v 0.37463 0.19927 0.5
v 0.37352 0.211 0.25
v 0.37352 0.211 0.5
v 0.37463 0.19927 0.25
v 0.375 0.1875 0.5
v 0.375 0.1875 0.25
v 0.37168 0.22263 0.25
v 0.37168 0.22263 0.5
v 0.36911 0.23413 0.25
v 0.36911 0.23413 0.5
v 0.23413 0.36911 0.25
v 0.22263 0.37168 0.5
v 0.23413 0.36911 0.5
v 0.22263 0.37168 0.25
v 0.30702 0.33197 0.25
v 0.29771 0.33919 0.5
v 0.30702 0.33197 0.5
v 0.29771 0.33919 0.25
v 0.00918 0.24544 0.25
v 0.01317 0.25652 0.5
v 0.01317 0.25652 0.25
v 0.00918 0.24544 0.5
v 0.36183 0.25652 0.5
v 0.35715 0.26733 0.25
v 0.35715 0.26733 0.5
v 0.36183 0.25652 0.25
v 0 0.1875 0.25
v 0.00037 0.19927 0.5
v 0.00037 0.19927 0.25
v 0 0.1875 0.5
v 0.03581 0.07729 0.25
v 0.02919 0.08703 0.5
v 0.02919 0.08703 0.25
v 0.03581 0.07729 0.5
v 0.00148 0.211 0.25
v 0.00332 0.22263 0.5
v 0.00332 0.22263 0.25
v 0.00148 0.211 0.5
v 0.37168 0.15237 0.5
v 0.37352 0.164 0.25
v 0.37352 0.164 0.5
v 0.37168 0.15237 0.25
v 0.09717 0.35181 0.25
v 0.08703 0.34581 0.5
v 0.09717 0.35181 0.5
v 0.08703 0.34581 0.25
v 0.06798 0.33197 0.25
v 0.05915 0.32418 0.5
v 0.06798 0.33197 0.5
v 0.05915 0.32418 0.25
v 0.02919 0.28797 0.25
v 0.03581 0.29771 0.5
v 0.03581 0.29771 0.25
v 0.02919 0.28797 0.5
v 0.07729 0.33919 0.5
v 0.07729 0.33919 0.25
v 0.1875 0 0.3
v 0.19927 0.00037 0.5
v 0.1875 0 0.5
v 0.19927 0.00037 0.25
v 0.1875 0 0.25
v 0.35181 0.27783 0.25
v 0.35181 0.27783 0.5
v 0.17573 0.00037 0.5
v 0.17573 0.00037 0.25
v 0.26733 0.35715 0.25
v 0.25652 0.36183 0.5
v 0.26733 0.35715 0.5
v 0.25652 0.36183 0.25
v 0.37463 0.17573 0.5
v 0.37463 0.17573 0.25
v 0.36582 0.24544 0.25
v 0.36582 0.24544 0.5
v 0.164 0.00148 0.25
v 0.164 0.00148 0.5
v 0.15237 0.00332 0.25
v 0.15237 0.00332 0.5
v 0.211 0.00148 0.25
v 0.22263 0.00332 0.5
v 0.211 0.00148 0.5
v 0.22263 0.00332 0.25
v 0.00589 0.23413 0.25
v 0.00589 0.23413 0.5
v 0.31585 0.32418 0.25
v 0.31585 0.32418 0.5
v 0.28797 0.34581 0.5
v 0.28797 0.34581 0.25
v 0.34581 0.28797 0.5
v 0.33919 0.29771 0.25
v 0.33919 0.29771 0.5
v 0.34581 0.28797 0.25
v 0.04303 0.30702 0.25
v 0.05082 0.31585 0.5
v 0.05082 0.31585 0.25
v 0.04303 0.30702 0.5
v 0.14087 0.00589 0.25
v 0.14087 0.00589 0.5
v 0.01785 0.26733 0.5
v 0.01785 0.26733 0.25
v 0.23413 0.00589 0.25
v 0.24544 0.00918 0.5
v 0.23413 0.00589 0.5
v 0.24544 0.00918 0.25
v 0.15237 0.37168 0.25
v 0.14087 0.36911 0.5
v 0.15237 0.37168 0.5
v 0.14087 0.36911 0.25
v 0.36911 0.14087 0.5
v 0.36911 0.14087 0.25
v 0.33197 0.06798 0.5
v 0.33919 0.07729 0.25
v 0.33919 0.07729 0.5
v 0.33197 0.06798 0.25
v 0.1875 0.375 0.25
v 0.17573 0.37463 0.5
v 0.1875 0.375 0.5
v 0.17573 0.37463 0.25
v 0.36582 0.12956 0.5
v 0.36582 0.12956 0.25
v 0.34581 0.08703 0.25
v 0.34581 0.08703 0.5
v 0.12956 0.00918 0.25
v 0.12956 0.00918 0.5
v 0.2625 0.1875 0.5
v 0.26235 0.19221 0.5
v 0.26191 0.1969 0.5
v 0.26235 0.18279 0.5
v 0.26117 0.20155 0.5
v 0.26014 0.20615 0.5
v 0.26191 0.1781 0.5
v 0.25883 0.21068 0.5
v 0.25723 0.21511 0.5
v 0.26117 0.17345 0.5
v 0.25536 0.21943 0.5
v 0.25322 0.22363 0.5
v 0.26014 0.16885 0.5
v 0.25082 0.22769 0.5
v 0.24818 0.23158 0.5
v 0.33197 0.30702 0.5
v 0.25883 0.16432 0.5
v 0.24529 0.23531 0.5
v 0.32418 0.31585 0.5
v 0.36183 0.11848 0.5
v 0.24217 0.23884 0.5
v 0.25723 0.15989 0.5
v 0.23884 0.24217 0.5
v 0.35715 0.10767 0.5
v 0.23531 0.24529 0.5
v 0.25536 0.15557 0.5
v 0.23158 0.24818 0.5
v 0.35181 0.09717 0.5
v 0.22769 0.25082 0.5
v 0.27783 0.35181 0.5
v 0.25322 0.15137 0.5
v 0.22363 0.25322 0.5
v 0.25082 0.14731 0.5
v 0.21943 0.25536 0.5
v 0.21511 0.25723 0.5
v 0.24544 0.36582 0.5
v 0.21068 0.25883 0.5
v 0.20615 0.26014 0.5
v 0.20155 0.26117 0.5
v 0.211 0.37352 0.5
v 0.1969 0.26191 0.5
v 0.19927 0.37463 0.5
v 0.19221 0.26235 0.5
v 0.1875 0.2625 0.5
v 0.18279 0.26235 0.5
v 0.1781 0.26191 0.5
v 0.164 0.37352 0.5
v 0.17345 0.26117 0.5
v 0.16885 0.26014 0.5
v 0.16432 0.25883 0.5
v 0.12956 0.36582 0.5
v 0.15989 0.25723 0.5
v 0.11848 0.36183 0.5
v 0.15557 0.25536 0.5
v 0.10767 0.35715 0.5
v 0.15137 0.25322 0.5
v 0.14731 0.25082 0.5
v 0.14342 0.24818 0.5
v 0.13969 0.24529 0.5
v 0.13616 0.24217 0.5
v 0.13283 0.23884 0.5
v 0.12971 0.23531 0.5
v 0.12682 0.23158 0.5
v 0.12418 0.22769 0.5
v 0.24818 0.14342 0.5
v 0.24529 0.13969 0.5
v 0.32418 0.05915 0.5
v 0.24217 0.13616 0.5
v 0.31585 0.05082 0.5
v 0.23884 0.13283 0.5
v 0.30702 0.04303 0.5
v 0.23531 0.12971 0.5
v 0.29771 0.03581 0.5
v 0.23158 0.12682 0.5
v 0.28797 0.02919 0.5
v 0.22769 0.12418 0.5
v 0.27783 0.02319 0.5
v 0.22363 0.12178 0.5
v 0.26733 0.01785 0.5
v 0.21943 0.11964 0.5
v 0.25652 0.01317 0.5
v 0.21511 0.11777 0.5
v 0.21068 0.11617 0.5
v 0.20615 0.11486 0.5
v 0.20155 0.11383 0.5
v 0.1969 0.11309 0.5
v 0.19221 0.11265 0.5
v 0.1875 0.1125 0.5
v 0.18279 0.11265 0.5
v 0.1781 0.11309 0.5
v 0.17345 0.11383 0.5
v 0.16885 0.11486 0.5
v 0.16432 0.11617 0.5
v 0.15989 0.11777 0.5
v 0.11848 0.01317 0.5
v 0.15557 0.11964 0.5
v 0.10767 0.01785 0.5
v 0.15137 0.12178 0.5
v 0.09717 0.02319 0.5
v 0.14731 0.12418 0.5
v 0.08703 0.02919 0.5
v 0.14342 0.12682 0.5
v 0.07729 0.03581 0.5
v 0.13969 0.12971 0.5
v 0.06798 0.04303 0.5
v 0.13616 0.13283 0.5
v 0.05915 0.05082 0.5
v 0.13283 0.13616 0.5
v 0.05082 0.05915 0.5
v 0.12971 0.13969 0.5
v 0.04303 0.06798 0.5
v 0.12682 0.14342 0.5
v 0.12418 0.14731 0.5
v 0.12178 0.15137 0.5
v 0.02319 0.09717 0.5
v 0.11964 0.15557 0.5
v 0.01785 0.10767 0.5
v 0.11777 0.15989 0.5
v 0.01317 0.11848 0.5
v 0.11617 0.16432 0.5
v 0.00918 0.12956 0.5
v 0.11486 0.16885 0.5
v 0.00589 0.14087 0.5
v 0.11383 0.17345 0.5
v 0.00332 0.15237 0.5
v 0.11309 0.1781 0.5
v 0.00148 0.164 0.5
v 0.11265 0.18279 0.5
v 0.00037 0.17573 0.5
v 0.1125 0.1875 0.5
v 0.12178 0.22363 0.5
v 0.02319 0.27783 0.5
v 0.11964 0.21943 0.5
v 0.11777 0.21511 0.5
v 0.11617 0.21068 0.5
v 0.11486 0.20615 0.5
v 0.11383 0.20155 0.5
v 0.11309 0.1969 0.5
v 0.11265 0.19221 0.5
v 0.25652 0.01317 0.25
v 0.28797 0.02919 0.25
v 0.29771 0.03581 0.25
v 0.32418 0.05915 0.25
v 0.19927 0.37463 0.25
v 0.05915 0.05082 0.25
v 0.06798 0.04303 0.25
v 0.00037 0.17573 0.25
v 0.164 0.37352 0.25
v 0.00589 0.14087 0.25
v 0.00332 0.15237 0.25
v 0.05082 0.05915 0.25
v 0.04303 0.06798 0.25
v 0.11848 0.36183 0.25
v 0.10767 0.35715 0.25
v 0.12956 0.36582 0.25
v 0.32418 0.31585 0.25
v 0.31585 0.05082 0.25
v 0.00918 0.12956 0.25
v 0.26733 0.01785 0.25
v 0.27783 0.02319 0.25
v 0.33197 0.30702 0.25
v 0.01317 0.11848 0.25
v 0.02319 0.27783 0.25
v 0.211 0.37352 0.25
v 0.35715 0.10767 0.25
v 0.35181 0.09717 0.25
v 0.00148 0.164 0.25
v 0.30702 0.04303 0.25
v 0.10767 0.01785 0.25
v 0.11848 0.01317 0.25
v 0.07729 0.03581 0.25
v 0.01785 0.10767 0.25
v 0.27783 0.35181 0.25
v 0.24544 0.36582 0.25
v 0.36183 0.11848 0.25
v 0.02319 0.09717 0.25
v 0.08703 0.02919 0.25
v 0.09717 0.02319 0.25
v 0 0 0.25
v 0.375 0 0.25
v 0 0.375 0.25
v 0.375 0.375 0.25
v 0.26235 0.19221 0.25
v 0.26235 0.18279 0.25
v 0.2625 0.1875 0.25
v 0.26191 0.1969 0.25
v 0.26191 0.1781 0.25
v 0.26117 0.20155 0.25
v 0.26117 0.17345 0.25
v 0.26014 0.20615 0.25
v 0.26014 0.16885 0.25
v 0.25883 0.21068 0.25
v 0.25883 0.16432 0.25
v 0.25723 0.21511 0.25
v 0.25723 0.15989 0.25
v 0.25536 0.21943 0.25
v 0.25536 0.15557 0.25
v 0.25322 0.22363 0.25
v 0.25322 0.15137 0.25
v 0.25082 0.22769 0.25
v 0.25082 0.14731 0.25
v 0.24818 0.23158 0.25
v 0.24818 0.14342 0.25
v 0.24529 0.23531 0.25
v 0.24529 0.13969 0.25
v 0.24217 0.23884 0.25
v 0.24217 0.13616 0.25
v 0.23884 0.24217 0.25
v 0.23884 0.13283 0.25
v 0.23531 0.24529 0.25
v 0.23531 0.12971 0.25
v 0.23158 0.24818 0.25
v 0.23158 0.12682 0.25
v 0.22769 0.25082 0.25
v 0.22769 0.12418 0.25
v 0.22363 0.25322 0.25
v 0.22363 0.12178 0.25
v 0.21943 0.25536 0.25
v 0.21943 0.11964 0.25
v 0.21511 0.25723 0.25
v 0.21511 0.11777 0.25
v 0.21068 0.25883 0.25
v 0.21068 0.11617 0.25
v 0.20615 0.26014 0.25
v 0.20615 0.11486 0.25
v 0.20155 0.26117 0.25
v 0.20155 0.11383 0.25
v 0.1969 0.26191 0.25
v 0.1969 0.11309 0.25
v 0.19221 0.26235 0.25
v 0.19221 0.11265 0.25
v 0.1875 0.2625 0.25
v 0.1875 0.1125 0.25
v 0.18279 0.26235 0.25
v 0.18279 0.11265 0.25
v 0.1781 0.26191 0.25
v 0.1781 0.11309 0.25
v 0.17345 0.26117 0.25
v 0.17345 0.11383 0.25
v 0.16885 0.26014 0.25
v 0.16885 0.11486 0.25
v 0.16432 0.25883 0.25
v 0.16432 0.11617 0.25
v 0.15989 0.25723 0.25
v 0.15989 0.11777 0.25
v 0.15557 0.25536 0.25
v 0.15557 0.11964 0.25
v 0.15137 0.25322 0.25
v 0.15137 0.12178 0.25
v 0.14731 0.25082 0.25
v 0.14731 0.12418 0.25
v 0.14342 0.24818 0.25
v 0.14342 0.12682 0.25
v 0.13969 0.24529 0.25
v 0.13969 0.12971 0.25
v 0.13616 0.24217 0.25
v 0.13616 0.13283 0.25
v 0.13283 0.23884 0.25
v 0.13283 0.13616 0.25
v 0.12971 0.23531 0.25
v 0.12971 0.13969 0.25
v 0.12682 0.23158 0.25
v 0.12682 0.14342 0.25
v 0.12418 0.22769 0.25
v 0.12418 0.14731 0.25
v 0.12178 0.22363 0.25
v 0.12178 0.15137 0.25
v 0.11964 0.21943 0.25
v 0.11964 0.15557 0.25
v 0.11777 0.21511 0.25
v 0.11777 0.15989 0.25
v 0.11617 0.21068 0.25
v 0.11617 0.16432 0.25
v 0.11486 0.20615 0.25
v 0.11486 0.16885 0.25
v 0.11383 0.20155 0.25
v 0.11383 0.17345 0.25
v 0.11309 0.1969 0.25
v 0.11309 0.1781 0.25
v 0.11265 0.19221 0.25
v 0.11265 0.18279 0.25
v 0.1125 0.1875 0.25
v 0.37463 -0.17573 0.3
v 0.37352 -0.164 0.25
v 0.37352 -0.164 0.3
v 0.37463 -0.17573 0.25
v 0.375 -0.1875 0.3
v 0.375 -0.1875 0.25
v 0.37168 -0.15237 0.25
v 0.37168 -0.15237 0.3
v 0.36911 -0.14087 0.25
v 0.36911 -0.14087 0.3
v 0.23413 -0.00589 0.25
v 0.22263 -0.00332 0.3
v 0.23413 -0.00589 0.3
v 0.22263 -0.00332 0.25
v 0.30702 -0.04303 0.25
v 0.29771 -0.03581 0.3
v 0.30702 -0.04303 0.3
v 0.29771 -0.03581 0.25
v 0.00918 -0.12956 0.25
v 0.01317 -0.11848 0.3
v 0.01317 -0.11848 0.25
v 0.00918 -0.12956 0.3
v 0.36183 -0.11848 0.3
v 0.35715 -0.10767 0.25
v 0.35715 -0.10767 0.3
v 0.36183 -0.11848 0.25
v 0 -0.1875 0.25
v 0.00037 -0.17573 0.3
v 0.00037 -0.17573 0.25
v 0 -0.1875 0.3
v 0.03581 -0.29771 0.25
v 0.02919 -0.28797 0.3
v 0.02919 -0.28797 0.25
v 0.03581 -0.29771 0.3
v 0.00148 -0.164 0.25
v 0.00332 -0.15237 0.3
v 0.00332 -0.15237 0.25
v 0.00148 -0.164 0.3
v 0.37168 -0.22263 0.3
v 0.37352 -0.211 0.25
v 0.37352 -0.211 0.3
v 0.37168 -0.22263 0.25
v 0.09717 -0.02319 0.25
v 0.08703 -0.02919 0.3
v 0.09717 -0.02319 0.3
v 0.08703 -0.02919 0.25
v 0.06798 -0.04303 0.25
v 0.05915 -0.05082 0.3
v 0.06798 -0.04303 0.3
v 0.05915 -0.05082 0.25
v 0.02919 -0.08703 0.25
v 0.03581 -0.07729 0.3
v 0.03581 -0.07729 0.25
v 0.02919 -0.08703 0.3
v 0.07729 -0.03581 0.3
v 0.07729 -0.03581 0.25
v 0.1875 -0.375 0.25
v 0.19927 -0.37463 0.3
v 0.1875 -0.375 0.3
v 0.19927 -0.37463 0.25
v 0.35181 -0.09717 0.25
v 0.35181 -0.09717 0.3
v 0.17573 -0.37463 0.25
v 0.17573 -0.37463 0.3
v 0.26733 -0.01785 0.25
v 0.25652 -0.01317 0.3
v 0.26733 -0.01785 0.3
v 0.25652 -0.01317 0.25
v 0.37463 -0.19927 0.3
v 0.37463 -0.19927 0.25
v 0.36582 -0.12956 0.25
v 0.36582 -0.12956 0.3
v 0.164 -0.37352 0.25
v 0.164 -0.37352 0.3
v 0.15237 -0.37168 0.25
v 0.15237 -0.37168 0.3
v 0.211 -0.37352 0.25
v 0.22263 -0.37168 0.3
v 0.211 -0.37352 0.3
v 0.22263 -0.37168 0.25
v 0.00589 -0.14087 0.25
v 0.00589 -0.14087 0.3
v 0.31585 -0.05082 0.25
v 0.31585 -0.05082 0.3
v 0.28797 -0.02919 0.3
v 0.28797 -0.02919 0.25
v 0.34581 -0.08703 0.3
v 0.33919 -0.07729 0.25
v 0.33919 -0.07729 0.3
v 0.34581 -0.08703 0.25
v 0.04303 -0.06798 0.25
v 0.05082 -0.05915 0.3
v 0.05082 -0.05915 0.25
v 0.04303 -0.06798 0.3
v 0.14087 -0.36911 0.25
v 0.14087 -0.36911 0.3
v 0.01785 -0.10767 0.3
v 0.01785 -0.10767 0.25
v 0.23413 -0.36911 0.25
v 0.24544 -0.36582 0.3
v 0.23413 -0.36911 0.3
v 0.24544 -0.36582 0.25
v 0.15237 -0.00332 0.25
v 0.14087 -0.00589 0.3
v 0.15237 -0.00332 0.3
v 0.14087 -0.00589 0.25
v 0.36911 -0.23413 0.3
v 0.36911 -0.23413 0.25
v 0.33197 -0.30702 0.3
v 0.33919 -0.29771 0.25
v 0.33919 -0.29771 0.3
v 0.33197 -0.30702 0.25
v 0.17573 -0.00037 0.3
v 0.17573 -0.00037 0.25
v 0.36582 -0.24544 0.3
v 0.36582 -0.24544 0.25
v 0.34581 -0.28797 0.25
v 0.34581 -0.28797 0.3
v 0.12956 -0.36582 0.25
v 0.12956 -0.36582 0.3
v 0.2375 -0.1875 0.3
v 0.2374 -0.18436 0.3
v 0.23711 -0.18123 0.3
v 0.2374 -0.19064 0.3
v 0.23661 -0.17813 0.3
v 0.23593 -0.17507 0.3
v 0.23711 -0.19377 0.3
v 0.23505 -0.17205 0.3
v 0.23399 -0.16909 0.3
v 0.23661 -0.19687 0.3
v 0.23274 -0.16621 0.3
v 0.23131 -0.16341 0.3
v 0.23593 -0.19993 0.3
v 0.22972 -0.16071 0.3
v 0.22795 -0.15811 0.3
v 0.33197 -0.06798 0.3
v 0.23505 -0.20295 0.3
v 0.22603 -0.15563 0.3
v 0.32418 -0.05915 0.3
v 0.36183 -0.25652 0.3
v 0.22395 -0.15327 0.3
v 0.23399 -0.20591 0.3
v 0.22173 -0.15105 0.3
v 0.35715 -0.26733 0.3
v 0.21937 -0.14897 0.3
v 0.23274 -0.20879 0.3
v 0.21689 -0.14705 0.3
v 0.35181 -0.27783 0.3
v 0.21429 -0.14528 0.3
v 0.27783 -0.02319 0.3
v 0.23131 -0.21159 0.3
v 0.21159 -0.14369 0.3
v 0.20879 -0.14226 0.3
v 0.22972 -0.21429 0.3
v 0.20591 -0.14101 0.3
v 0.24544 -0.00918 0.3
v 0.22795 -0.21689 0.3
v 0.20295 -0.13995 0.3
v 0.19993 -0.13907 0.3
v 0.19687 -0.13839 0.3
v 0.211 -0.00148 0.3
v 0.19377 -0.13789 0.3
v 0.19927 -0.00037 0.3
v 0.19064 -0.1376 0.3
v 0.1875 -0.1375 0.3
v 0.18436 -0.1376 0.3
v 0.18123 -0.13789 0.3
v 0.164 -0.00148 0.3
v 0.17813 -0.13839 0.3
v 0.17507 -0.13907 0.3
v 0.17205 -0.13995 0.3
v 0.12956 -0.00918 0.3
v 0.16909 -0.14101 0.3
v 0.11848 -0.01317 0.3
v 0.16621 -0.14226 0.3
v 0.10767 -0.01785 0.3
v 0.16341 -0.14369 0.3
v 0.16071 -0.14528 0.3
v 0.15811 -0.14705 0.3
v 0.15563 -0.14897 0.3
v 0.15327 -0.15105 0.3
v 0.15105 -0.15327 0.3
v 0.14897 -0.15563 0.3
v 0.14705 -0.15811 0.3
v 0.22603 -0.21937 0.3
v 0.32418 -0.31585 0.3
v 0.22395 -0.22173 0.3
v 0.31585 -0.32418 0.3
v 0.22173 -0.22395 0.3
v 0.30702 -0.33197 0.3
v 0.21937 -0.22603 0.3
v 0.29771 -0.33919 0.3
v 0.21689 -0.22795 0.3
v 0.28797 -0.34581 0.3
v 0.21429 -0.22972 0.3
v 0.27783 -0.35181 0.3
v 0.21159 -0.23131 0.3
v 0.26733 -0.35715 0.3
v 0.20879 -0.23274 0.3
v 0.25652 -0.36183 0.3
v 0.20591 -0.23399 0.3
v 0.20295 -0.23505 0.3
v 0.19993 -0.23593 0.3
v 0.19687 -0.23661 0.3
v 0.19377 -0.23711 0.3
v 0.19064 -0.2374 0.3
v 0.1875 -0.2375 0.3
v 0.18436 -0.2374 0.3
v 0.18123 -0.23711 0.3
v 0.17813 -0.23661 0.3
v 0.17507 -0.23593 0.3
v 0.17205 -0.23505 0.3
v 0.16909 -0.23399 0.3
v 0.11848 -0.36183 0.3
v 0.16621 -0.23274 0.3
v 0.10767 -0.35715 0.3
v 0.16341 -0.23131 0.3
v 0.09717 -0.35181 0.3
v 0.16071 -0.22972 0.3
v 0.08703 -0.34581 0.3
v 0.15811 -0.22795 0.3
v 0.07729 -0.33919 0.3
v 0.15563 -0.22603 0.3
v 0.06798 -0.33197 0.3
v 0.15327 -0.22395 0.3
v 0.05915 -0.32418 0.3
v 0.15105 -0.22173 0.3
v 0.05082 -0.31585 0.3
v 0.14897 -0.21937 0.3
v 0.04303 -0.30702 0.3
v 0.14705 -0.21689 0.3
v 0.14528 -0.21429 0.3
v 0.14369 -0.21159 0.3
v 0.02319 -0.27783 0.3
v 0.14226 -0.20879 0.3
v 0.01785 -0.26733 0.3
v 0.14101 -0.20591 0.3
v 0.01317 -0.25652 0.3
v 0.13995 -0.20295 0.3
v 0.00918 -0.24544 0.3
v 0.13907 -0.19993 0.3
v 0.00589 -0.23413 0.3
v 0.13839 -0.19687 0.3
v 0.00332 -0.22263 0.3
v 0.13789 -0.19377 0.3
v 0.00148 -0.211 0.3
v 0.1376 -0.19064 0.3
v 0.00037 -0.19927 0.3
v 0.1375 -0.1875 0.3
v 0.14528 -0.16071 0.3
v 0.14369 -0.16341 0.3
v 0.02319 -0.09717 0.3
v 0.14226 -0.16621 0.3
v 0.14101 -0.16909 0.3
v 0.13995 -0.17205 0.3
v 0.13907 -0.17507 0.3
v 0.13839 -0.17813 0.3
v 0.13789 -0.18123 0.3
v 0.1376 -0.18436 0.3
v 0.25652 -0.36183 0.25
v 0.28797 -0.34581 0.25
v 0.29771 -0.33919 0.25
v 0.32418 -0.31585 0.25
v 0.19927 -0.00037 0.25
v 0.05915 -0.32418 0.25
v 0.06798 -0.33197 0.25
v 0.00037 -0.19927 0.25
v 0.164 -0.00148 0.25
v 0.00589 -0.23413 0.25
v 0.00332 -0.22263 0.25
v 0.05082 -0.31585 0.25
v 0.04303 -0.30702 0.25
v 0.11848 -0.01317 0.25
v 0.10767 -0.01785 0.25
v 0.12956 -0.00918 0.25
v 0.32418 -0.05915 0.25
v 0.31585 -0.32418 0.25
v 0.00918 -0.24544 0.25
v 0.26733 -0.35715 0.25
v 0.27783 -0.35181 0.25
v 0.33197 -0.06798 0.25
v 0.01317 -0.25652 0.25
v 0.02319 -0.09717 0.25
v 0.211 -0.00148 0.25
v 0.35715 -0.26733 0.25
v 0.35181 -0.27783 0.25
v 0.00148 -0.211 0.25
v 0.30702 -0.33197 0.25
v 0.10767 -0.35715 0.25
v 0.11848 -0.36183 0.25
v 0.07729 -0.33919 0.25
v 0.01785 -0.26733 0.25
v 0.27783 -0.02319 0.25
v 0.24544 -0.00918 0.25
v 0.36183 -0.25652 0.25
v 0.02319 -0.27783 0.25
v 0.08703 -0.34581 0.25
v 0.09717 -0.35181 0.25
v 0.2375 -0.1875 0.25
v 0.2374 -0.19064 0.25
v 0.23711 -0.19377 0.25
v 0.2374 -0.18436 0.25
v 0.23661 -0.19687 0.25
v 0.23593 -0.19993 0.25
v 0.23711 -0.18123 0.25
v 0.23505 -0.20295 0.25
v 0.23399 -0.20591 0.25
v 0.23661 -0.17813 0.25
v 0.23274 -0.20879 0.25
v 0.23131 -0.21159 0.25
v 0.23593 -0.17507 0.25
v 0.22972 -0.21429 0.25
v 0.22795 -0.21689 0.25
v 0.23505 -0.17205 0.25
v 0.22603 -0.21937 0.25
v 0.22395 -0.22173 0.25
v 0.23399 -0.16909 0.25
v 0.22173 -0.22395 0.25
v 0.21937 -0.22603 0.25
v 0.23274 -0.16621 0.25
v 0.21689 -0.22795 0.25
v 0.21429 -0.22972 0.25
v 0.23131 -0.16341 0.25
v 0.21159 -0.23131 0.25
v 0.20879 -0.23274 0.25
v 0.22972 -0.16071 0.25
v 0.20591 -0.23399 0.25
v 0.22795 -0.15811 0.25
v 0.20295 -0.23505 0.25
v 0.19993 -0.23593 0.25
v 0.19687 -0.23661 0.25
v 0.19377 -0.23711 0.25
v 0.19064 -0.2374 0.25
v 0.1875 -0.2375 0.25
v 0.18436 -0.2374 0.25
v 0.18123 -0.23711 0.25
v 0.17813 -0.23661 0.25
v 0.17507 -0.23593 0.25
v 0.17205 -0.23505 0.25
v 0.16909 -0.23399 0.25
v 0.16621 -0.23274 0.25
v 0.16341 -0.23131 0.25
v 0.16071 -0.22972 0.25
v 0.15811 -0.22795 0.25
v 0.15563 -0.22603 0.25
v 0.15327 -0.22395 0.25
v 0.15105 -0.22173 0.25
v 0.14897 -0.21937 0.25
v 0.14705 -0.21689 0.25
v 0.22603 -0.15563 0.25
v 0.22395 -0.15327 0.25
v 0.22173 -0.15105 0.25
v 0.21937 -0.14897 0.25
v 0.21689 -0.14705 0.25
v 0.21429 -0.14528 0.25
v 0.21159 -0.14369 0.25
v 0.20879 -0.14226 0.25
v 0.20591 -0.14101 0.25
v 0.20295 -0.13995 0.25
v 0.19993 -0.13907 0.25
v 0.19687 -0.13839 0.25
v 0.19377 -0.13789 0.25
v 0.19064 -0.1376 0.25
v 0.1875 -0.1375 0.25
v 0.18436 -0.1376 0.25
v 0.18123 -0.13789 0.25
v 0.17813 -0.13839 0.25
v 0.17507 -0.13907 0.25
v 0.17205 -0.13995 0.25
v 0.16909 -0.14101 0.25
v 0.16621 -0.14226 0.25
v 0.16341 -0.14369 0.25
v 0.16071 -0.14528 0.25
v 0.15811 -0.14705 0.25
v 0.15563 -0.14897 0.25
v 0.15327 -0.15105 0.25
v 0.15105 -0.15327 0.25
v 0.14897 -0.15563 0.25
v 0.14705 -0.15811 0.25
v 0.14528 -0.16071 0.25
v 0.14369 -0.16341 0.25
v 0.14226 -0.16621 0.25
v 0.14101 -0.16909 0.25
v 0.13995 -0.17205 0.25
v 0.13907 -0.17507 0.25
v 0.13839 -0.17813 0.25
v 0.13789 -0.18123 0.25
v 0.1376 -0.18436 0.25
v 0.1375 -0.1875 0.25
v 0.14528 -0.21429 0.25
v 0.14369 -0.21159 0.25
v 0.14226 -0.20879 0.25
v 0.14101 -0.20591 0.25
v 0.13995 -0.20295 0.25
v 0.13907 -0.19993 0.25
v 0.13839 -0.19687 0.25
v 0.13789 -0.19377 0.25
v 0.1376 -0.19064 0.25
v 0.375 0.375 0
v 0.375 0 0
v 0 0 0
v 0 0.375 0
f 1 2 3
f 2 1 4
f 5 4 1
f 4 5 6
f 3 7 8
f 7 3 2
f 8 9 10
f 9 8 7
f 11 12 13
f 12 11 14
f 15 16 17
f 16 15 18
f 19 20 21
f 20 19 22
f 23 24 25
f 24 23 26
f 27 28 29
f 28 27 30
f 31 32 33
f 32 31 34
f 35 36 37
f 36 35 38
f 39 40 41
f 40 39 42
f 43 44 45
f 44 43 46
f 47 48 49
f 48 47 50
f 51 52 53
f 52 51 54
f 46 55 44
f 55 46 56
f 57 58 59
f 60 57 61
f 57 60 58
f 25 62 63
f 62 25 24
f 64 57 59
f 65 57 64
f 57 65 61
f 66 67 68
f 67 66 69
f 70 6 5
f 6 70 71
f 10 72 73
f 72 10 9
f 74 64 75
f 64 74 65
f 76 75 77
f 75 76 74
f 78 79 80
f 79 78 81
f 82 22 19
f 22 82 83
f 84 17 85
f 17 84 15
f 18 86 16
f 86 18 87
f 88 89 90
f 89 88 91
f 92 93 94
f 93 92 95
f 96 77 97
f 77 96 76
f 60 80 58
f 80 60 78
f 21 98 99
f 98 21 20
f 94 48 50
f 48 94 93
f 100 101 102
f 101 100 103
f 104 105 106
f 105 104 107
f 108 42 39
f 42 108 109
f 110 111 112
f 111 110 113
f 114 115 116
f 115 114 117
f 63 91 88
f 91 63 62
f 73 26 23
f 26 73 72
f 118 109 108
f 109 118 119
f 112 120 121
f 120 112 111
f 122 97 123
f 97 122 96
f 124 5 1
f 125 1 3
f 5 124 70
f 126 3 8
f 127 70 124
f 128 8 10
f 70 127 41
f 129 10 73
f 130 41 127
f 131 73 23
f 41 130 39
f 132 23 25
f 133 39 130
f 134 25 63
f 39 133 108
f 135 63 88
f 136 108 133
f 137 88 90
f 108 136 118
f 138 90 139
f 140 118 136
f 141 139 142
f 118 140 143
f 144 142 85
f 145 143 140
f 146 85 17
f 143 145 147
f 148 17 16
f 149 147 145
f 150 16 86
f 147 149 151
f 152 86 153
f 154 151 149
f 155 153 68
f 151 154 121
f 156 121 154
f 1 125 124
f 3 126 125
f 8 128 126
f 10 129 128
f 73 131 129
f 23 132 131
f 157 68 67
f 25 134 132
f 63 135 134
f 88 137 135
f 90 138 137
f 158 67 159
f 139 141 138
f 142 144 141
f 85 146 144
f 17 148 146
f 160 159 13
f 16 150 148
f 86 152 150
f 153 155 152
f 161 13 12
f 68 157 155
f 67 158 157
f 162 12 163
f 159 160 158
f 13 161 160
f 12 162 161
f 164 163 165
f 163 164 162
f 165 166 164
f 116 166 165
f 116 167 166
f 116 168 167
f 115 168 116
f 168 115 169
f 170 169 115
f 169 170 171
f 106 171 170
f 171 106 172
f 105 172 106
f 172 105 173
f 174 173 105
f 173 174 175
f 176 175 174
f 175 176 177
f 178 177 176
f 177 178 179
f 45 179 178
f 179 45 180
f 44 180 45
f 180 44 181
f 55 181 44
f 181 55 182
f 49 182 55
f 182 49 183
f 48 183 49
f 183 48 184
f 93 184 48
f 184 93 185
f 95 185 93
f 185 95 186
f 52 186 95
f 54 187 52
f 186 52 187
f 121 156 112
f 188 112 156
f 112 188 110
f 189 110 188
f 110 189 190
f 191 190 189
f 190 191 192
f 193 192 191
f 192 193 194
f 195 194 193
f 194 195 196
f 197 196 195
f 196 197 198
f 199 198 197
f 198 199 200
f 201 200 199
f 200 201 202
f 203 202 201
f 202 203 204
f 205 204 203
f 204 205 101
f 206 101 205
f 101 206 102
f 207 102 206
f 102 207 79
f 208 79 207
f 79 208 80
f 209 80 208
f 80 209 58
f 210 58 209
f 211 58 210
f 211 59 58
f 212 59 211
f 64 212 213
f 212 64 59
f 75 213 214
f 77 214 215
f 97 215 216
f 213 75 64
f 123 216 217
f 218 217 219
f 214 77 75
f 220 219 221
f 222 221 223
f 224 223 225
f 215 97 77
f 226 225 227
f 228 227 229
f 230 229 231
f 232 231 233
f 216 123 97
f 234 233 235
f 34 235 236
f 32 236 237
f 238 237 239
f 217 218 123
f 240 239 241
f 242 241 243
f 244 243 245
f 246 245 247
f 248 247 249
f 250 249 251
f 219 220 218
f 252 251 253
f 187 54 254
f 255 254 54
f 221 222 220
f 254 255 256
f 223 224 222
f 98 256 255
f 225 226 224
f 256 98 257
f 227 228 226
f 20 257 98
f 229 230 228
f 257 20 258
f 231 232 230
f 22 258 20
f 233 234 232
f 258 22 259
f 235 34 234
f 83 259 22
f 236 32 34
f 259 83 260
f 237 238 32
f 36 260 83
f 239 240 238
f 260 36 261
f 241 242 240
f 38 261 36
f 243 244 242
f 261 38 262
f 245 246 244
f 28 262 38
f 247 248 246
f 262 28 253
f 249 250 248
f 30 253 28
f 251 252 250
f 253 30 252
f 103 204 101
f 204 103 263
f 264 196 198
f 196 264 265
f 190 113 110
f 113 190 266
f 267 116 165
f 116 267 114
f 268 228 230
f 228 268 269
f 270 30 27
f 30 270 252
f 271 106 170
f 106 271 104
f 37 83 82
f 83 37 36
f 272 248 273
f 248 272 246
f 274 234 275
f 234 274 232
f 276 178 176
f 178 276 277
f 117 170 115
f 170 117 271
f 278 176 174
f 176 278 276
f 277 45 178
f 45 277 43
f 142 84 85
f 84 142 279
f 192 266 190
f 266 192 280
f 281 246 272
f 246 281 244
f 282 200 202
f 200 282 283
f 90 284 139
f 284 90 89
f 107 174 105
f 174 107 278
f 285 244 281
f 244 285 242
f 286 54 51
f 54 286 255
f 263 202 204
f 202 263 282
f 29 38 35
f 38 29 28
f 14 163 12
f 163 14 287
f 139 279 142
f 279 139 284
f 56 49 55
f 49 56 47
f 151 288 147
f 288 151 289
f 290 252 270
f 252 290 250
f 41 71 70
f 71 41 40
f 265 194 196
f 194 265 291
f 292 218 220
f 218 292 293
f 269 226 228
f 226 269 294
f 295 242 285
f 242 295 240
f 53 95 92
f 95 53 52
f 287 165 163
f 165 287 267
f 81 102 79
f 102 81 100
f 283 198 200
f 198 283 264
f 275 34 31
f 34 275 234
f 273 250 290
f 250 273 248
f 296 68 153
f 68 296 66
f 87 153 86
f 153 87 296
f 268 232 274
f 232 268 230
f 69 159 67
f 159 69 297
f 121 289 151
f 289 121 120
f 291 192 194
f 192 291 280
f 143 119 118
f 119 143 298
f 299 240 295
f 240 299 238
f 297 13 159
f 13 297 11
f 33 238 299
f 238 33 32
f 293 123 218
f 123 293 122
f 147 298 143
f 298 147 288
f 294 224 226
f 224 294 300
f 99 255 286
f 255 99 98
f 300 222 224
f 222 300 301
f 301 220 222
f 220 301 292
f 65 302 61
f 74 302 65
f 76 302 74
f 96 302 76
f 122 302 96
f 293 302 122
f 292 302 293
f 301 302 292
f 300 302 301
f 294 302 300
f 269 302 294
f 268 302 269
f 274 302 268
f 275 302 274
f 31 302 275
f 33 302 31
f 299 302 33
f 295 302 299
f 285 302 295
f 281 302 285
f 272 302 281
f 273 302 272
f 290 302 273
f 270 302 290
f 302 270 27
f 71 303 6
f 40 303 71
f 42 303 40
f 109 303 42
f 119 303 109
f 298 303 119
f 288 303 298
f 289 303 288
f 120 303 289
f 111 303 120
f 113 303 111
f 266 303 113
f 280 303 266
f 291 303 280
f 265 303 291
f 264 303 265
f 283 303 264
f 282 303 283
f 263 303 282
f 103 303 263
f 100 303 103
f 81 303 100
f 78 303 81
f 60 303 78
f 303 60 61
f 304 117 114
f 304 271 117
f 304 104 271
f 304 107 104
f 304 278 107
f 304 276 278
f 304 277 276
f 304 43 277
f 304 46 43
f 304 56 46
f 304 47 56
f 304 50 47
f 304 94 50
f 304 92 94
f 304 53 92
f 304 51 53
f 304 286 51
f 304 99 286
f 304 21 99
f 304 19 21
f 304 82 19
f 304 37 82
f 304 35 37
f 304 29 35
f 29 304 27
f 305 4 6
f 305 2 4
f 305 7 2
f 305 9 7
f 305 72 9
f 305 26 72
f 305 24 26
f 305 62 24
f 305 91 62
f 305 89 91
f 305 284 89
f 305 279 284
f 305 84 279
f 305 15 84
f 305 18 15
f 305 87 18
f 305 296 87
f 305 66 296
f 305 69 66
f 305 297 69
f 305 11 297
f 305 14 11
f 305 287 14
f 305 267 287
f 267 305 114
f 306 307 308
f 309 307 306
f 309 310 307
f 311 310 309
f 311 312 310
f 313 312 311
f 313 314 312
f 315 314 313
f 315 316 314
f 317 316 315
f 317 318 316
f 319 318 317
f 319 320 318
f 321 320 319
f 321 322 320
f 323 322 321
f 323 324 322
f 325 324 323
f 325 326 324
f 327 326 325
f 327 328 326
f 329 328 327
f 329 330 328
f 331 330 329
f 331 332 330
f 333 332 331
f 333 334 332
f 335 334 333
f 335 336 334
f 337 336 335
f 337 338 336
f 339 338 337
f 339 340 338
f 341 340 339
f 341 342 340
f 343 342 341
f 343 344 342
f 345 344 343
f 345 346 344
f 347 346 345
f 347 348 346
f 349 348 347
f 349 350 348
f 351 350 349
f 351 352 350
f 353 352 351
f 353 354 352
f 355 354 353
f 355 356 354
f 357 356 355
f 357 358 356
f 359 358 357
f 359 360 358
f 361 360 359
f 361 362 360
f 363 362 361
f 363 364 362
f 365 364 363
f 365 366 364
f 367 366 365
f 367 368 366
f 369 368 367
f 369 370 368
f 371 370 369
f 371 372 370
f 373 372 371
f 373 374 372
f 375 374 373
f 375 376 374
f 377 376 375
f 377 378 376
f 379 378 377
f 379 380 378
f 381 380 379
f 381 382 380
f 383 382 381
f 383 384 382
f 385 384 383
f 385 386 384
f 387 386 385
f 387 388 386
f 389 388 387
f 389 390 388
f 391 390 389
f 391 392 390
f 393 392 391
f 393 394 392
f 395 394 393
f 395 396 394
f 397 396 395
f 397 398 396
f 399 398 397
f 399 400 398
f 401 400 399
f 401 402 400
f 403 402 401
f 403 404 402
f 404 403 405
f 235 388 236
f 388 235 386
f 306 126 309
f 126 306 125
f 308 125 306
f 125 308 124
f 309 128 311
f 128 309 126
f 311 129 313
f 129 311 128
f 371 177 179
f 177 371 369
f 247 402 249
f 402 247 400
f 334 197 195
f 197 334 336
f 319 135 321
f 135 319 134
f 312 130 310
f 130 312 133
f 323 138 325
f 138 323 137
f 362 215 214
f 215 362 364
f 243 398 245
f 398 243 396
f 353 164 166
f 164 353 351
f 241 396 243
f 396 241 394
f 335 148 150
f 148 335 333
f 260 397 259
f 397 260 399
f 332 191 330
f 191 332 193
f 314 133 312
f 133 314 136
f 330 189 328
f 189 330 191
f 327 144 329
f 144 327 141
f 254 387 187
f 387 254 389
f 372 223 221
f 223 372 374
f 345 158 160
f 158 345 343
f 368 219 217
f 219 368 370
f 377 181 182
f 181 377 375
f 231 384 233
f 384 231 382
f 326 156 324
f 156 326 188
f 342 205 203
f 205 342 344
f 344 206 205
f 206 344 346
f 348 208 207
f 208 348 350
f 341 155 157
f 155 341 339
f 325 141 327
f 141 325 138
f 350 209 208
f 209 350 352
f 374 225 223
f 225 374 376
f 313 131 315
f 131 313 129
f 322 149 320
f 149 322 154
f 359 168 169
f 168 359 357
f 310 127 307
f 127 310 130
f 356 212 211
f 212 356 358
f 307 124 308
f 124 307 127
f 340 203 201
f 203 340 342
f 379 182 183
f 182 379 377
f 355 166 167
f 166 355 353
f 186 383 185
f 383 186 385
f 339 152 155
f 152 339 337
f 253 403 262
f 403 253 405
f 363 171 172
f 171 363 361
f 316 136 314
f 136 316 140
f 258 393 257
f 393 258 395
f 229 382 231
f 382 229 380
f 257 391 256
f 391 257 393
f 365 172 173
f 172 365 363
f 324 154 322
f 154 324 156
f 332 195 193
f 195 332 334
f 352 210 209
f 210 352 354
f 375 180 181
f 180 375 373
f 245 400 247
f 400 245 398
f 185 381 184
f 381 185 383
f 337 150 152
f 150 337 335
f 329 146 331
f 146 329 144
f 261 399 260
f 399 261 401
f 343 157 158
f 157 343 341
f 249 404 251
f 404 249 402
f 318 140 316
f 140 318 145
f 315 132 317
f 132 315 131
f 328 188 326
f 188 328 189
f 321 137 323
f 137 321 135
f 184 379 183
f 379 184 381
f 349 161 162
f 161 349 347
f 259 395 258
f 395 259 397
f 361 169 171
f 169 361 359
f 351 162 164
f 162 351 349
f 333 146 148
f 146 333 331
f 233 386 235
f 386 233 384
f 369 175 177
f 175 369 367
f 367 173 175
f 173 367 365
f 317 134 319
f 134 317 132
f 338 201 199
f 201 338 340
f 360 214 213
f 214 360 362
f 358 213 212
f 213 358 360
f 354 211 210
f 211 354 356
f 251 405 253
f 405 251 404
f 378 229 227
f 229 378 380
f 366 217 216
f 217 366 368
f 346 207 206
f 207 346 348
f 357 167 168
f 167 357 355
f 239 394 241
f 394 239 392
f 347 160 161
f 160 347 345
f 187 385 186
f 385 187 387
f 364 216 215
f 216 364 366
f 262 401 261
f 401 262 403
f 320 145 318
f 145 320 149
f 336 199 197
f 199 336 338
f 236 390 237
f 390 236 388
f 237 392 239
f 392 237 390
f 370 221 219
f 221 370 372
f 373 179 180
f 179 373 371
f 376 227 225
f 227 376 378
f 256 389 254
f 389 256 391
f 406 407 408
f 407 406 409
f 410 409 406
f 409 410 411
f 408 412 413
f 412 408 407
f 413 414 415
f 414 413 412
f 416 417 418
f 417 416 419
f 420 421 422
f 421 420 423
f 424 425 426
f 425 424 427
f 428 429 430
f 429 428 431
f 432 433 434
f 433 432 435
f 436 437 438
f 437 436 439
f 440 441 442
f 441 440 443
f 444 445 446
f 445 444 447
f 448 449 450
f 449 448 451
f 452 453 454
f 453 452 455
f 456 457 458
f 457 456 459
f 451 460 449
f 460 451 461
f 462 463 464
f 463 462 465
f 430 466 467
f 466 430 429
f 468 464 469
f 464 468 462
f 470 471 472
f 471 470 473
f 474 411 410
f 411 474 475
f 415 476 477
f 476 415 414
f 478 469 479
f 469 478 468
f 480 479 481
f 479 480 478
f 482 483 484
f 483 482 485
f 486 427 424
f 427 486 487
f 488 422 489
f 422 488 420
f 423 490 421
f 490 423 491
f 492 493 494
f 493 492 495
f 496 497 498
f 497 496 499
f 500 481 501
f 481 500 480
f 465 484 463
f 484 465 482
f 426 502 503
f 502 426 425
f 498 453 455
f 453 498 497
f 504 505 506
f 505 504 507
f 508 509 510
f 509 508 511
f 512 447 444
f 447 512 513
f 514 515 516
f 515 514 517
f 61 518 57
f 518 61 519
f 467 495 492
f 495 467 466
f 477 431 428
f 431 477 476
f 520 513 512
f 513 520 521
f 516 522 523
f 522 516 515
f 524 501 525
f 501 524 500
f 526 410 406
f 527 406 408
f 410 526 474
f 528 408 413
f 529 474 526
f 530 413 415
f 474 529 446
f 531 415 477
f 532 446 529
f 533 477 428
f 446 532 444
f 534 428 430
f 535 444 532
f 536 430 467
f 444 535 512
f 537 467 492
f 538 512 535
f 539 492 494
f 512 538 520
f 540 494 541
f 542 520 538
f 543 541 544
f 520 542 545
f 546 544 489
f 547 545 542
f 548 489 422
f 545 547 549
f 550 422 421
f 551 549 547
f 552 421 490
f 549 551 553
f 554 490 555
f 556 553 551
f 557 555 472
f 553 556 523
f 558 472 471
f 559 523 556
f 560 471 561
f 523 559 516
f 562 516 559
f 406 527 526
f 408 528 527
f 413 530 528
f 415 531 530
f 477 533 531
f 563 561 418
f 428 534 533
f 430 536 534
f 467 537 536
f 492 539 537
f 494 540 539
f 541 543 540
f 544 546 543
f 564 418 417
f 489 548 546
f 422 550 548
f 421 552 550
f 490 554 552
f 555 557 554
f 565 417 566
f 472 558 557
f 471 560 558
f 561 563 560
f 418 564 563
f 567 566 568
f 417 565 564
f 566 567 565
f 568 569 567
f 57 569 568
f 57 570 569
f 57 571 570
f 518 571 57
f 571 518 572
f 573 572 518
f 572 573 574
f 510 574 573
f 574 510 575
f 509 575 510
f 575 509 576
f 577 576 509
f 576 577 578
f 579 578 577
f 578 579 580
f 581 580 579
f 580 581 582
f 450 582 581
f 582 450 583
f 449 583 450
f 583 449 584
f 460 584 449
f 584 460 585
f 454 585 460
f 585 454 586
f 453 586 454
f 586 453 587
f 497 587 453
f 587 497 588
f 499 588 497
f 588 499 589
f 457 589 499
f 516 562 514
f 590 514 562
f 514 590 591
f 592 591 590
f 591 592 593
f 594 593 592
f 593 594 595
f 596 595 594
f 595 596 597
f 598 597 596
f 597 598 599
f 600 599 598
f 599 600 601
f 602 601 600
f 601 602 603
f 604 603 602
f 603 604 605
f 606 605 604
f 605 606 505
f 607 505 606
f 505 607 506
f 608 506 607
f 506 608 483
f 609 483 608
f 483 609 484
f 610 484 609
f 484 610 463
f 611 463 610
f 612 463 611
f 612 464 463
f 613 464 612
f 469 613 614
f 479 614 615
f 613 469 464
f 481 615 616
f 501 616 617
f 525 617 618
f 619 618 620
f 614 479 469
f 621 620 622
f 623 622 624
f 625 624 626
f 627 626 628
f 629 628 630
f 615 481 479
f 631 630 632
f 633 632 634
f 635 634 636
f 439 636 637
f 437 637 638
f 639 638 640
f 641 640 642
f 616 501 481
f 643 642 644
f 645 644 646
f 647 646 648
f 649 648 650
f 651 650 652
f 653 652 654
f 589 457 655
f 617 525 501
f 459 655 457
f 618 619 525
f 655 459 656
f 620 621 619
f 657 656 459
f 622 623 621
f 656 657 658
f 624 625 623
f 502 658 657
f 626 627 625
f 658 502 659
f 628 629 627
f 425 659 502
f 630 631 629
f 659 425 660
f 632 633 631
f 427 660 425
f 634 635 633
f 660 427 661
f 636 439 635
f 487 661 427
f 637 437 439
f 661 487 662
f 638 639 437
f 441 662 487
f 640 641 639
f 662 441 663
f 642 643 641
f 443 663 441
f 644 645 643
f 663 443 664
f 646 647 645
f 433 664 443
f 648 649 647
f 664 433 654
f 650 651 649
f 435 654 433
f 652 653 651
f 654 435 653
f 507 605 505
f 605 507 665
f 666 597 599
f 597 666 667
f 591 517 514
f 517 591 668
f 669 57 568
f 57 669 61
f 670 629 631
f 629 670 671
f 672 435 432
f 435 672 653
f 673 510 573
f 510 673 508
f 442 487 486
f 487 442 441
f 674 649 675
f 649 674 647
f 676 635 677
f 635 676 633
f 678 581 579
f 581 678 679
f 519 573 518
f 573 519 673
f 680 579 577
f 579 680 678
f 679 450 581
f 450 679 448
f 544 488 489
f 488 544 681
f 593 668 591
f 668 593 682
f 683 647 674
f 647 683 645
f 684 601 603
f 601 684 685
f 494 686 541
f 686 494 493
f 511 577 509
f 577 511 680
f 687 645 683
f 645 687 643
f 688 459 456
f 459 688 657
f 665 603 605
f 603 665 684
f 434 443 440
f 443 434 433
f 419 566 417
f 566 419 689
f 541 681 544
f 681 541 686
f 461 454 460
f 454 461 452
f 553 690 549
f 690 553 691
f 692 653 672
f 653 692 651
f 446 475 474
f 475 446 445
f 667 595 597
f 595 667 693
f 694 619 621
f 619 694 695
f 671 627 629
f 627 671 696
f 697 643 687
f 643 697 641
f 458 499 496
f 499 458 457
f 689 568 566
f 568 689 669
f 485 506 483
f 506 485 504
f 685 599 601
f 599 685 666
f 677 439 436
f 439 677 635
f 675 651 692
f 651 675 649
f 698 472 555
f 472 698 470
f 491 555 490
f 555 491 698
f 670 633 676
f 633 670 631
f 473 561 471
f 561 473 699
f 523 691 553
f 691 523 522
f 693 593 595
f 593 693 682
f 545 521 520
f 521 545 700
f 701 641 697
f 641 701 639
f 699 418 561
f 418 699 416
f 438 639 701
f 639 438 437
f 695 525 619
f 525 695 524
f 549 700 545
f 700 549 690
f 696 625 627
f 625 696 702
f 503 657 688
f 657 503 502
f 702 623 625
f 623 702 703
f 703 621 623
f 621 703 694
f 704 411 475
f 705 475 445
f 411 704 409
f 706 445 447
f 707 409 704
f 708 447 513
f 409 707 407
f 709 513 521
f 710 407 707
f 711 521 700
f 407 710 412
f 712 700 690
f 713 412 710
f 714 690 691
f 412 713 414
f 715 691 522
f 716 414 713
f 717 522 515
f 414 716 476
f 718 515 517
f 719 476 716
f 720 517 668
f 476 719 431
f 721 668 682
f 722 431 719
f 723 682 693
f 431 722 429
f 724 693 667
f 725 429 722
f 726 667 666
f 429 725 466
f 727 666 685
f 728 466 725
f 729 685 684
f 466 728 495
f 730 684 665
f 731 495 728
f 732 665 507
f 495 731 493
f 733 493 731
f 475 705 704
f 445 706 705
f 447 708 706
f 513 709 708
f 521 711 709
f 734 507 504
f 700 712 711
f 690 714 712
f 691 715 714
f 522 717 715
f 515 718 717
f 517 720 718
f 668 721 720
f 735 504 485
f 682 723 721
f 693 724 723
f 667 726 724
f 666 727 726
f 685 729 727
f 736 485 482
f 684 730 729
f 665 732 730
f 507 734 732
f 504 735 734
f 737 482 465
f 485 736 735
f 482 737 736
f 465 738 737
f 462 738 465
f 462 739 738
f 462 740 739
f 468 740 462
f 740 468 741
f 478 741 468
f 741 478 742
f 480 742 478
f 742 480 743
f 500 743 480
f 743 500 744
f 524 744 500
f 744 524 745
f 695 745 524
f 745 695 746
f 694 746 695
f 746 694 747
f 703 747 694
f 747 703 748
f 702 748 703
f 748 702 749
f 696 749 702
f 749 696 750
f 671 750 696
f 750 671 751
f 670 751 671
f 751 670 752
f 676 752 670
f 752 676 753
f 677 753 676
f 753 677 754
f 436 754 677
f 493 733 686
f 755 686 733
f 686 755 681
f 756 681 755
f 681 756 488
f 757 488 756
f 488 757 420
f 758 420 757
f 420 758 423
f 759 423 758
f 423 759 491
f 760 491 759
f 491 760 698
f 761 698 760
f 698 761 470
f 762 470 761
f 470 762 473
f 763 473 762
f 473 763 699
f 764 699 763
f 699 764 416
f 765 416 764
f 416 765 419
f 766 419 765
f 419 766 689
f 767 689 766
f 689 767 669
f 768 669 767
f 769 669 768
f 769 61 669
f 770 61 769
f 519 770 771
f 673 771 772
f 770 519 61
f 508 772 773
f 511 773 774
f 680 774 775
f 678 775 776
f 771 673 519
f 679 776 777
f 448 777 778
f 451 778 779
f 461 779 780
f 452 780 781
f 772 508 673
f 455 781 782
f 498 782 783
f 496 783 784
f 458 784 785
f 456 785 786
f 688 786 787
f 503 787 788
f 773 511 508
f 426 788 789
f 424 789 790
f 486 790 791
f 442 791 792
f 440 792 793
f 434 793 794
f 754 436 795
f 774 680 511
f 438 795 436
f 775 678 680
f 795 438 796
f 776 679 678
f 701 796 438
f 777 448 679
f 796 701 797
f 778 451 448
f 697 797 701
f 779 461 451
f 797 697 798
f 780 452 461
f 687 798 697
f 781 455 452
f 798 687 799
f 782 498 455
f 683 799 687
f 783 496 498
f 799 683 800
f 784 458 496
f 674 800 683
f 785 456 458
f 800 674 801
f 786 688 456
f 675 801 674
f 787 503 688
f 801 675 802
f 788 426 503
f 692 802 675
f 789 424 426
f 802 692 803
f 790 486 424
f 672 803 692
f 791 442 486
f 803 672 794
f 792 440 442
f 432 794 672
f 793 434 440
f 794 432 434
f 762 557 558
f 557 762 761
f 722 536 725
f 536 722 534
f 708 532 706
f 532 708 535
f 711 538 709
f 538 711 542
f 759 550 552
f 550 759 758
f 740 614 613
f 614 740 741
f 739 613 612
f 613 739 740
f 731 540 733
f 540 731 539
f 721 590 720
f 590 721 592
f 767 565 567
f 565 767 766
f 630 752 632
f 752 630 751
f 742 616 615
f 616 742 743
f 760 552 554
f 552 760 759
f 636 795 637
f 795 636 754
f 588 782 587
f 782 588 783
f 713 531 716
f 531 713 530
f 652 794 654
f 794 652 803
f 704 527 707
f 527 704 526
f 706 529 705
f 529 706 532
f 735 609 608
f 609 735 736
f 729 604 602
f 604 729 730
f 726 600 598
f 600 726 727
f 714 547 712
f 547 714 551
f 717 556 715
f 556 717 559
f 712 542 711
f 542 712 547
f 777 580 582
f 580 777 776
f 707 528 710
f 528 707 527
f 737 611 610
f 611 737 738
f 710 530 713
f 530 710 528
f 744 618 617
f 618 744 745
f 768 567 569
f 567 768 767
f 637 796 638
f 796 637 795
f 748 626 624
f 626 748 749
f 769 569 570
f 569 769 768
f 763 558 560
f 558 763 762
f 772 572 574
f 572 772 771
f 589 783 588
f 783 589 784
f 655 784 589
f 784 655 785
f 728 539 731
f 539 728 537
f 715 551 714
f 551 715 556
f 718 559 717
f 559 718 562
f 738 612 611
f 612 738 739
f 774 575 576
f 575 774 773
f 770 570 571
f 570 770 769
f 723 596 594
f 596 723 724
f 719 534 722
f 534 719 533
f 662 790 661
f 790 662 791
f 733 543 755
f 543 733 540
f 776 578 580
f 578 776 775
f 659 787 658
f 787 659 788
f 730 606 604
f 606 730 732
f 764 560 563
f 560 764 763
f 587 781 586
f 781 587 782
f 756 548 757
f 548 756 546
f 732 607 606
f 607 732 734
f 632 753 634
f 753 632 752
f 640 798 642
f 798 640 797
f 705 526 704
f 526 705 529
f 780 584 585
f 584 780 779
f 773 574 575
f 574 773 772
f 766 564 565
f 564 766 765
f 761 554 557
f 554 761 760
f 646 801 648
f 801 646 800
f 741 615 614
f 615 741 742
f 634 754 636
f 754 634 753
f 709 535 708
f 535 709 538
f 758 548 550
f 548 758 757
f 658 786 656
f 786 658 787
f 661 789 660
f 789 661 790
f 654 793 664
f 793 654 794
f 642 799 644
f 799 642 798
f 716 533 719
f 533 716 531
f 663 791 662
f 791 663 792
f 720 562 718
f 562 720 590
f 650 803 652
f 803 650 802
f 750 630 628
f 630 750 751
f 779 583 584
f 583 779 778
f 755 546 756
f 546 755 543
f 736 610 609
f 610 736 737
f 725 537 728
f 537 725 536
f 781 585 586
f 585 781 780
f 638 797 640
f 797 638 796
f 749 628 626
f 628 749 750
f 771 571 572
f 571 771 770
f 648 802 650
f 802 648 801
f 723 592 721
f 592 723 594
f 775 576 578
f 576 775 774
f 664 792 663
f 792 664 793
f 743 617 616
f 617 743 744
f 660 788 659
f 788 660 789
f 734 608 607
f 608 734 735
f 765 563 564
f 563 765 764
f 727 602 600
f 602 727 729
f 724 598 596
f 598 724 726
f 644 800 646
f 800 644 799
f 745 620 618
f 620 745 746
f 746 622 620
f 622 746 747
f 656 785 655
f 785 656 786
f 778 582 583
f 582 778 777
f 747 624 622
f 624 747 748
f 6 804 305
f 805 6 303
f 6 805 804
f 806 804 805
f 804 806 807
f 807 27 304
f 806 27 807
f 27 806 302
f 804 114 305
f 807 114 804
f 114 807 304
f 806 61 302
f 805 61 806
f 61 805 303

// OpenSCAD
// Parametric dimensions for annular sleeve with tab and underside recess
length = 0.375;
width = 0.375;
height = 0.25;
main_extrusion = 0.25;

// Main annular cylinder parameters
main_center_x = 0.1875;
main_center_y = 0.1875;
main_outer_radius = 0.1875;
main_bore_radius = 0.075;

// Shallow tab parameters
tab_bounding_length = 0.375;
tab_bounding_width = 0.5625;
tab_center_x = 0.1875;
tab_center_y = -0.1875;
tab_outer_radius = 0.1875;
tab_bore_radius = 0.05;
tab_height = 0.05;

// Underside recess parameters
recess_length = 0.2557;
recess_width = 0.2884;
recess_left_offset = 0.0597;
recess_right_offset = 0.0596;
recess_front_offset = 0.0433;
recess_back_offset = 0.0433;
recess_center_x = 0.1875;
recess_center_y = 0.1875;
recess_radius = 0.075;
recess_start_z = 0;
recess_end_z = 0.125;

// Resolution for smooth curves
$fn = 100;

// Module for creating annular cylinder (tube)
module annular_cylinder(outer_r, inner_r, h) {
    difference() {
        cylinder(h=h, r=outer_r);
        cylinder(h=h, r=inner_r);
    }
}

// Main model construction
union() {
    // Base rectangular solid
    cube([length, width, height]);
    
    // Main annular cylinder on upper side
    translate([main_center_x, main_center_y, height]) {
        annular_cylinder(main_outer_radius, main_bore_radius, main_extrusion);
    }
    
    // Shallow attached annular tab on upper side
    translate([tab_center_x, tab_center_y, height]) {
        annular_cylinder(tab_outer_radius, tab_bore_radius, tab_height);
    }
}

// Underside recess cut (subtract from base)
difference() {
    children(0); // Reference the union above
    translate([recess_center_x, recess_center_y, recess_start_z]) {
        cylinder(h=recess_end_z - recess_start_z, r=recess_radius);
    }
}
